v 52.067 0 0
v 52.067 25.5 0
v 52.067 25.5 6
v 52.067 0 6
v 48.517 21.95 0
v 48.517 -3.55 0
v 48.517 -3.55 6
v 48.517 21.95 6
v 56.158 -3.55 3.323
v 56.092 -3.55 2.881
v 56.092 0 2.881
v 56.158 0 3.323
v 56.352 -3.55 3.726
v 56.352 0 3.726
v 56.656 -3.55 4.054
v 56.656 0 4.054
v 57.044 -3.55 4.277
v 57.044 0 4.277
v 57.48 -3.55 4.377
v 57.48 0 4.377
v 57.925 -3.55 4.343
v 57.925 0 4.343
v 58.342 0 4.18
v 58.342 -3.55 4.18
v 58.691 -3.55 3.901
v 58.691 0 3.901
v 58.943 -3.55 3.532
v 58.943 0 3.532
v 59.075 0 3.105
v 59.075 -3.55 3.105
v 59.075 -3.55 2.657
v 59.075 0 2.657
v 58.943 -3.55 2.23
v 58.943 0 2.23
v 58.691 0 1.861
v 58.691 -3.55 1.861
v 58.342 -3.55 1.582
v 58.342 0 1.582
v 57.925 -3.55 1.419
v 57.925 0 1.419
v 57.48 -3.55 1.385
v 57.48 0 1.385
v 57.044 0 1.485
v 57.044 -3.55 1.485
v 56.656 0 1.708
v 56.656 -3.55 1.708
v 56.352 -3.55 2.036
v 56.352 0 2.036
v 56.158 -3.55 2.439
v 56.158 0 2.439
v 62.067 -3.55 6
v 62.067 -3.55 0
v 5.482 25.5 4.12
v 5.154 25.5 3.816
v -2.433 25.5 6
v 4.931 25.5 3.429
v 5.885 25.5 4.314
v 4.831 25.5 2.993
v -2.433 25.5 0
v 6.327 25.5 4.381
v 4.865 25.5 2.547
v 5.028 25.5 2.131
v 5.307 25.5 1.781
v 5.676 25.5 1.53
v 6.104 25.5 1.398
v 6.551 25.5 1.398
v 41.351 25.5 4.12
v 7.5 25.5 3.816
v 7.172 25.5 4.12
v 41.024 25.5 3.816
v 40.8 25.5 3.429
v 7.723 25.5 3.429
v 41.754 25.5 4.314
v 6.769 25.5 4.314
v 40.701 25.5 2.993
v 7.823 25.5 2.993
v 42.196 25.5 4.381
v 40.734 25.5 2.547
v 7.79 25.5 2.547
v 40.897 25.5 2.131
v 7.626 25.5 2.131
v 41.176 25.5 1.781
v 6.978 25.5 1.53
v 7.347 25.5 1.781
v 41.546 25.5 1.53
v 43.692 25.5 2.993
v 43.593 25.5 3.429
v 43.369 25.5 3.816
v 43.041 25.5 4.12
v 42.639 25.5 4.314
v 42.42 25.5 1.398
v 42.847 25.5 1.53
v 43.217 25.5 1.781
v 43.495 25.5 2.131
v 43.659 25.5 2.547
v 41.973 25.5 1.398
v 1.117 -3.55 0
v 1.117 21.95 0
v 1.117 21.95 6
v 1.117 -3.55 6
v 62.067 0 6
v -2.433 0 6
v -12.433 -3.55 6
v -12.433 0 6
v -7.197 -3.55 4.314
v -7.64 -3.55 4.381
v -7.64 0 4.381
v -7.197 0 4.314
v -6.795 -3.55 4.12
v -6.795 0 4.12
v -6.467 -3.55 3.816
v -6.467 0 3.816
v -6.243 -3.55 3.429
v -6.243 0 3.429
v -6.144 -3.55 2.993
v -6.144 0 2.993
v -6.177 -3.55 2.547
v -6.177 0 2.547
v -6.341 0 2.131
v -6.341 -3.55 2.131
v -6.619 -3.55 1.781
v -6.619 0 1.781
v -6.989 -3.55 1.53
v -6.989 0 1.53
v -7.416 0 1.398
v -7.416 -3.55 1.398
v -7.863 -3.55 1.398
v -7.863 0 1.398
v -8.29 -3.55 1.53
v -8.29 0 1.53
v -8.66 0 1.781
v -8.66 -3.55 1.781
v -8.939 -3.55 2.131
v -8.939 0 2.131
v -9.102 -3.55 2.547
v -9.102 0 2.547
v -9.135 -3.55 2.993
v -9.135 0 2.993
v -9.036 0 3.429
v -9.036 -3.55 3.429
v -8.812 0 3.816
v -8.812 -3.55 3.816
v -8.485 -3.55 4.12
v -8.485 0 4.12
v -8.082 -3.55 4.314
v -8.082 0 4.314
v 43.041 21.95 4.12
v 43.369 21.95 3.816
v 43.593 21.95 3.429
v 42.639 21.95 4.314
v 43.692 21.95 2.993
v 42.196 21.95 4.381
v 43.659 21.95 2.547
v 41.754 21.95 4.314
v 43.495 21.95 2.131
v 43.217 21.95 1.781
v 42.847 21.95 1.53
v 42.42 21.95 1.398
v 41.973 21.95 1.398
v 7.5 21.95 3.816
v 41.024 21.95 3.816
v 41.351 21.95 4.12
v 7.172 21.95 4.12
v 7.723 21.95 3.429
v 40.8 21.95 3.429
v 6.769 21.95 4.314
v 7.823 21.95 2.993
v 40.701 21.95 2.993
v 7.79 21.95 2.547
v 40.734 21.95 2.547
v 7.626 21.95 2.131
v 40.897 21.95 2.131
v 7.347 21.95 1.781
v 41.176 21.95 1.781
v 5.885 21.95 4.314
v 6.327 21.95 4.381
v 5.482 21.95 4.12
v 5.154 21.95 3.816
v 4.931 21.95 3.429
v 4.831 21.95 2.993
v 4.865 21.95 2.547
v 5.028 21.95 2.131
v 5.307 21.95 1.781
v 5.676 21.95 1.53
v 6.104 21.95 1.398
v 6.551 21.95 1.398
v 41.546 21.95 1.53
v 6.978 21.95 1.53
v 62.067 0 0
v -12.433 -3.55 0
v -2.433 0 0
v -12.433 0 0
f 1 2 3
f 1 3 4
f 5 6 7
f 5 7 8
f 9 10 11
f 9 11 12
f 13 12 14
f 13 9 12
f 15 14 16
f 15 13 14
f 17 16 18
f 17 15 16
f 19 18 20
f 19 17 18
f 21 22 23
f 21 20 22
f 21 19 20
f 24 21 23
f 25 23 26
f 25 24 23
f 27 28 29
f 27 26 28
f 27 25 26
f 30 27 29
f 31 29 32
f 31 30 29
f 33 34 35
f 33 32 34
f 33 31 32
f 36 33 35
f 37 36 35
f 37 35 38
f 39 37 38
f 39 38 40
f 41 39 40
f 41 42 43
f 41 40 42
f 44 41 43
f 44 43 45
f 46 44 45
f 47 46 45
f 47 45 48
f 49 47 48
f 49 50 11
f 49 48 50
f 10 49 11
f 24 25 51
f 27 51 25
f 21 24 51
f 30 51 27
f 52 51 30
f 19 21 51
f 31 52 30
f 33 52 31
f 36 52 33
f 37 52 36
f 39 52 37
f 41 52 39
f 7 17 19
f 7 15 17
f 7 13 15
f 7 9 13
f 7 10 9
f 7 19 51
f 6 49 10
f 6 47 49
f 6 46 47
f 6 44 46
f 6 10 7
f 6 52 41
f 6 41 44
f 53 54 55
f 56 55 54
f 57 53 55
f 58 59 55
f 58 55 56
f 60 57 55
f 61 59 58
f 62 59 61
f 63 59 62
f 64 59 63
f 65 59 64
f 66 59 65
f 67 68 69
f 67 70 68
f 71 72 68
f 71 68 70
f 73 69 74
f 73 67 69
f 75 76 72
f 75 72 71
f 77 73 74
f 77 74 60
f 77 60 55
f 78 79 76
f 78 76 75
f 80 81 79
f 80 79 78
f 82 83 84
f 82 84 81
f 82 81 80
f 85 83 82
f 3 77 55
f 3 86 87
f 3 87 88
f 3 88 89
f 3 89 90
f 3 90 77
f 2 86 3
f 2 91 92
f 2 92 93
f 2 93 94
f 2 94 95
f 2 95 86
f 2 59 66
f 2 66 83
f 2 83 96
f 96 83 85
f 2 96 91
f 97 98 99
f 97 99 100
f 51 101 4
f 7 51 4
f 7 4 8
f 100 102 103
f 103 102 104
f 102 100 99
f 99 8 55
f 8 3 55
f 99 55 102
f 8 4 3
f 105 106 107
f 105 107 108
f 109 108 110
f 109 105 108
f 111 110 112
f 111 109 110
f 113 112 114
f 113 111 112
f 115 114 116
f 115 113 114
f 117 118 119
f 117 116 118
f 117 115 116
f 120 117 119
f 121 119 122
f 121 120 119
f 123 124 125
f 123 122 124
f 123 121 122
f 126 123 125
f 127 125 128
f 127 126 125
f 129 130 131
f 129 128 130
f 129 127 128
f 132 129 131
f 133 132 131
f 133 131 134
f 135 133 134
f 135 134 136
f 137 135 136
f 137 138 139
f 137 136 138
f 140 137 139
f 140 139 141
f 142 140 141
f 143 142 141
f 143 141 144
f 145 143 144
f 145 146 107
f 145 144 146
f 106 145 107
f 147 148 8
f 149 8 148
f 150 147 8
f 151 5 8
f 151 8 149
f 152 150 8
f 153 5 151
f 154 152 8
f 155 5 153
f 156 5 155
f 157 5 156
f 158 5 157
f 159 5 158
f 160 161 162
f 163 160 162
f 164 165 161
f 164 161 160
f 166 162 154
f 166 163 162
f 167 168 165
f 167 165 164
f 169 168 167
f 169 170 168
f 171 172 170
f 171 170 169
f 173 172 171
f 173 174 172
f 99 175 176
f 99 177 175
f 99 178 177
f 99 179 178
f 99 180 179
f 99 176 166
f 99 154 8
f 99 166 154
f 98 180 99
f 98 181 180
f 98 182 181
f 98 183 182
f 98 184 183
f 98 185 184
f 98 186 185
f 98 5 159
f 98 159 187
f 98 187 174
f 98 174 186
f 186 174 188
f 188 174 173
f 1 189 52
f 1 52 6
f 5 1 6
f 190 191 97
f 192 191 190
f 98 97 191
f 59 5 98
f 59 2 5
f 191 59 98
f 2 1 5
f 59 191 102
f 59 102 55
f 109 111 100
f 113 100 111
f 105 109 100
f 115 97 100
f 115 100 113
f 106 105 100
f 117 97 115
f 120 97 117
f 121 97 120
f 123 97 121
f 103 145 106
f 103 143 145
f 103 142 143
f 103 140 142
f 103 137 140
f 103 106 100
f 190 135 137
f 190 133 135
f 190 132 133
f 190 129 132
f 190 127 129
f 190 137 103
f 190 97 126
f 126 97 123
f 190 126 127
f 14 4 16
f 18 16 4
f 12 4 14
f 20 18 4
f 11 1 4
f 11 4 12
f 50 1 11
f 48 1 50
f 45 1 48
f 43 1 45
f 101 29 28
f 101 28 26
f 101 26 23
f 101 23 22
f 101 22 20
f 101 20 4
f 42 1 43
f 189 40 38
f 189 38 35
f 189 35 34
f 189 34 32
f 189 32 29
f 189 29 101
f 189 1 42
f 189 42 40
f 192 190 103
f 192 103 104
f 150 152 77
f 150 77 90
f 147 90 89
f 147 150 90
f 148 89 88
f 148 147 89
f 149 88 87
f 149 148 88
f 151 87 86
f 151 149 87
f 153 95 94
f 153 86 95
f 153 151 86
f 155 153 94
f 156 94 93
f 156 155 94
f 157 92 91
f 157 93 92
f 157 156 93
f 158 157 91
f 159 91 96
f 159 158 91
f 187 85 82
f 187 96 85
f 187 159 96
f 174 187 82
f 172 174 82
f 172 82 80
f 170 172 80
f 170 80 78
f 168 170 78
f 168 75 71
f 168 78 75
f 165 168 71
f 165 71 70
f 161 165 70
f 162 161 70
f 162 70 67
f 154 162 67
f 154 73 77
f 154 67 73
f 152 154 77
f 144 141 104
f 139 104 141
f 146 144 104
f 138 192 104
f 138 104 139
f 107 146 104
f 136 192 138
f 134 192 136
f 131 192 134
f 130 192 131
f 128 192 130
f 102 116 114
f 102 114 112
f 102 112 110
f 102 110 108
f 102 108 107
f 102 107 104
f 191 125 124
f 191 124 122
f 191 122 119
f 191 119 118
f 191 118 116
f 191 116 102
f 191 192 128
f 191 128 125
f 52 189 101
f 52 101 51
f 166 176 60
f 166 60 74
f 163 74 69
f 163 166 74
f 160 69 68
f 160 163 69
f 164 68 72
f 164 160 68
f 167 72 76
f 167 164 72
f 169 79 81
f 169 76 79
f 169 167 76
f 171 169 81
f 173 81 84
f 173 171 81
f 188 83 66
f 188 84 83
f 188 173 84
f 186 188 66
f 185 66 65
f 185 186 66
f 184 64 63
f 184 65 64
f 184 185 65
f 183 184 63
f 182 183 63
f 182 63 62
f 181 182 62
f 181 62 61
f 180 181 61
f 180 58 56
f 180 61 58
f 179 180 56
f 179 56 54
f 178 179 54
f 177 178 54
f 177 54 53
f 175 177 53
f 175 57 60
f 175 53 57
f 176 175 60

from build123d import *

# Parameters (mm, degrees)
EXTRUDE_THIN4_DEPTH     = 6
CUT_EXTRUDE1_DEPTH      = 41
CUT_EXTRUDE1_DEPTH_BACK = 28
SKETCH3_R               = 1.5


with BuildPart() as part:
    # Sketch1 → Extrude-Thin4 (new body)
    with BuildSketch(Plane.XY):
        Polygon((-12.432700034, 0), (-2.432700034, 0), (-2.432700034, 25.5), (52.067299966, 25.5), (52.067299966, 0), (62.067299966, 0), (62.067299966, -3.550080031), (48.517219935, -3.550080031), (48.517219935, 21.949919969), (1.117379996, 21.949919969), (1.117379996, -3.550080031), (-12.432700034, -3.550080031), align=None)
    extrude(amount=EXTRUDE_THIN4_DEPTH)

    # Sketch3 → Cut-Extrude1 (cut, two sides: drawn at the far end of the back side and taken through both)
    with BuildSketch(Plane(origin=(0, 0, 0), x_dir=(1, 0, 0), z_dir=(0, 1, 0)).offset(-CUT_EXTRUDE1_DEPTH_BACK)):
        with Locations(Location((-7.639613875, -2.880964864, 0), (0, 0, 270))):
            Circle(SKETCH3_R)
        with Locations(Location((6.327175455, -2.880964864, 0), (0, 0, 270))):
            Circle(SKETCH3_R)
        with Locations(Location((42.196429871, -2.880964864, 0), (0, 0, 270))):
            Circle(SKETCH3_R)
        with Locations(Location((57.591640837, -2.880964864, 0), (0, 0, 180))):
            Circle(SKETCH3_R)
    extrude(amount=CUT_EXTRUDE1_DEPTH + CUT_EXTRUDE1_DEPTH_BACK, mode=Mode.SUBTRACT)


solid = part.part
